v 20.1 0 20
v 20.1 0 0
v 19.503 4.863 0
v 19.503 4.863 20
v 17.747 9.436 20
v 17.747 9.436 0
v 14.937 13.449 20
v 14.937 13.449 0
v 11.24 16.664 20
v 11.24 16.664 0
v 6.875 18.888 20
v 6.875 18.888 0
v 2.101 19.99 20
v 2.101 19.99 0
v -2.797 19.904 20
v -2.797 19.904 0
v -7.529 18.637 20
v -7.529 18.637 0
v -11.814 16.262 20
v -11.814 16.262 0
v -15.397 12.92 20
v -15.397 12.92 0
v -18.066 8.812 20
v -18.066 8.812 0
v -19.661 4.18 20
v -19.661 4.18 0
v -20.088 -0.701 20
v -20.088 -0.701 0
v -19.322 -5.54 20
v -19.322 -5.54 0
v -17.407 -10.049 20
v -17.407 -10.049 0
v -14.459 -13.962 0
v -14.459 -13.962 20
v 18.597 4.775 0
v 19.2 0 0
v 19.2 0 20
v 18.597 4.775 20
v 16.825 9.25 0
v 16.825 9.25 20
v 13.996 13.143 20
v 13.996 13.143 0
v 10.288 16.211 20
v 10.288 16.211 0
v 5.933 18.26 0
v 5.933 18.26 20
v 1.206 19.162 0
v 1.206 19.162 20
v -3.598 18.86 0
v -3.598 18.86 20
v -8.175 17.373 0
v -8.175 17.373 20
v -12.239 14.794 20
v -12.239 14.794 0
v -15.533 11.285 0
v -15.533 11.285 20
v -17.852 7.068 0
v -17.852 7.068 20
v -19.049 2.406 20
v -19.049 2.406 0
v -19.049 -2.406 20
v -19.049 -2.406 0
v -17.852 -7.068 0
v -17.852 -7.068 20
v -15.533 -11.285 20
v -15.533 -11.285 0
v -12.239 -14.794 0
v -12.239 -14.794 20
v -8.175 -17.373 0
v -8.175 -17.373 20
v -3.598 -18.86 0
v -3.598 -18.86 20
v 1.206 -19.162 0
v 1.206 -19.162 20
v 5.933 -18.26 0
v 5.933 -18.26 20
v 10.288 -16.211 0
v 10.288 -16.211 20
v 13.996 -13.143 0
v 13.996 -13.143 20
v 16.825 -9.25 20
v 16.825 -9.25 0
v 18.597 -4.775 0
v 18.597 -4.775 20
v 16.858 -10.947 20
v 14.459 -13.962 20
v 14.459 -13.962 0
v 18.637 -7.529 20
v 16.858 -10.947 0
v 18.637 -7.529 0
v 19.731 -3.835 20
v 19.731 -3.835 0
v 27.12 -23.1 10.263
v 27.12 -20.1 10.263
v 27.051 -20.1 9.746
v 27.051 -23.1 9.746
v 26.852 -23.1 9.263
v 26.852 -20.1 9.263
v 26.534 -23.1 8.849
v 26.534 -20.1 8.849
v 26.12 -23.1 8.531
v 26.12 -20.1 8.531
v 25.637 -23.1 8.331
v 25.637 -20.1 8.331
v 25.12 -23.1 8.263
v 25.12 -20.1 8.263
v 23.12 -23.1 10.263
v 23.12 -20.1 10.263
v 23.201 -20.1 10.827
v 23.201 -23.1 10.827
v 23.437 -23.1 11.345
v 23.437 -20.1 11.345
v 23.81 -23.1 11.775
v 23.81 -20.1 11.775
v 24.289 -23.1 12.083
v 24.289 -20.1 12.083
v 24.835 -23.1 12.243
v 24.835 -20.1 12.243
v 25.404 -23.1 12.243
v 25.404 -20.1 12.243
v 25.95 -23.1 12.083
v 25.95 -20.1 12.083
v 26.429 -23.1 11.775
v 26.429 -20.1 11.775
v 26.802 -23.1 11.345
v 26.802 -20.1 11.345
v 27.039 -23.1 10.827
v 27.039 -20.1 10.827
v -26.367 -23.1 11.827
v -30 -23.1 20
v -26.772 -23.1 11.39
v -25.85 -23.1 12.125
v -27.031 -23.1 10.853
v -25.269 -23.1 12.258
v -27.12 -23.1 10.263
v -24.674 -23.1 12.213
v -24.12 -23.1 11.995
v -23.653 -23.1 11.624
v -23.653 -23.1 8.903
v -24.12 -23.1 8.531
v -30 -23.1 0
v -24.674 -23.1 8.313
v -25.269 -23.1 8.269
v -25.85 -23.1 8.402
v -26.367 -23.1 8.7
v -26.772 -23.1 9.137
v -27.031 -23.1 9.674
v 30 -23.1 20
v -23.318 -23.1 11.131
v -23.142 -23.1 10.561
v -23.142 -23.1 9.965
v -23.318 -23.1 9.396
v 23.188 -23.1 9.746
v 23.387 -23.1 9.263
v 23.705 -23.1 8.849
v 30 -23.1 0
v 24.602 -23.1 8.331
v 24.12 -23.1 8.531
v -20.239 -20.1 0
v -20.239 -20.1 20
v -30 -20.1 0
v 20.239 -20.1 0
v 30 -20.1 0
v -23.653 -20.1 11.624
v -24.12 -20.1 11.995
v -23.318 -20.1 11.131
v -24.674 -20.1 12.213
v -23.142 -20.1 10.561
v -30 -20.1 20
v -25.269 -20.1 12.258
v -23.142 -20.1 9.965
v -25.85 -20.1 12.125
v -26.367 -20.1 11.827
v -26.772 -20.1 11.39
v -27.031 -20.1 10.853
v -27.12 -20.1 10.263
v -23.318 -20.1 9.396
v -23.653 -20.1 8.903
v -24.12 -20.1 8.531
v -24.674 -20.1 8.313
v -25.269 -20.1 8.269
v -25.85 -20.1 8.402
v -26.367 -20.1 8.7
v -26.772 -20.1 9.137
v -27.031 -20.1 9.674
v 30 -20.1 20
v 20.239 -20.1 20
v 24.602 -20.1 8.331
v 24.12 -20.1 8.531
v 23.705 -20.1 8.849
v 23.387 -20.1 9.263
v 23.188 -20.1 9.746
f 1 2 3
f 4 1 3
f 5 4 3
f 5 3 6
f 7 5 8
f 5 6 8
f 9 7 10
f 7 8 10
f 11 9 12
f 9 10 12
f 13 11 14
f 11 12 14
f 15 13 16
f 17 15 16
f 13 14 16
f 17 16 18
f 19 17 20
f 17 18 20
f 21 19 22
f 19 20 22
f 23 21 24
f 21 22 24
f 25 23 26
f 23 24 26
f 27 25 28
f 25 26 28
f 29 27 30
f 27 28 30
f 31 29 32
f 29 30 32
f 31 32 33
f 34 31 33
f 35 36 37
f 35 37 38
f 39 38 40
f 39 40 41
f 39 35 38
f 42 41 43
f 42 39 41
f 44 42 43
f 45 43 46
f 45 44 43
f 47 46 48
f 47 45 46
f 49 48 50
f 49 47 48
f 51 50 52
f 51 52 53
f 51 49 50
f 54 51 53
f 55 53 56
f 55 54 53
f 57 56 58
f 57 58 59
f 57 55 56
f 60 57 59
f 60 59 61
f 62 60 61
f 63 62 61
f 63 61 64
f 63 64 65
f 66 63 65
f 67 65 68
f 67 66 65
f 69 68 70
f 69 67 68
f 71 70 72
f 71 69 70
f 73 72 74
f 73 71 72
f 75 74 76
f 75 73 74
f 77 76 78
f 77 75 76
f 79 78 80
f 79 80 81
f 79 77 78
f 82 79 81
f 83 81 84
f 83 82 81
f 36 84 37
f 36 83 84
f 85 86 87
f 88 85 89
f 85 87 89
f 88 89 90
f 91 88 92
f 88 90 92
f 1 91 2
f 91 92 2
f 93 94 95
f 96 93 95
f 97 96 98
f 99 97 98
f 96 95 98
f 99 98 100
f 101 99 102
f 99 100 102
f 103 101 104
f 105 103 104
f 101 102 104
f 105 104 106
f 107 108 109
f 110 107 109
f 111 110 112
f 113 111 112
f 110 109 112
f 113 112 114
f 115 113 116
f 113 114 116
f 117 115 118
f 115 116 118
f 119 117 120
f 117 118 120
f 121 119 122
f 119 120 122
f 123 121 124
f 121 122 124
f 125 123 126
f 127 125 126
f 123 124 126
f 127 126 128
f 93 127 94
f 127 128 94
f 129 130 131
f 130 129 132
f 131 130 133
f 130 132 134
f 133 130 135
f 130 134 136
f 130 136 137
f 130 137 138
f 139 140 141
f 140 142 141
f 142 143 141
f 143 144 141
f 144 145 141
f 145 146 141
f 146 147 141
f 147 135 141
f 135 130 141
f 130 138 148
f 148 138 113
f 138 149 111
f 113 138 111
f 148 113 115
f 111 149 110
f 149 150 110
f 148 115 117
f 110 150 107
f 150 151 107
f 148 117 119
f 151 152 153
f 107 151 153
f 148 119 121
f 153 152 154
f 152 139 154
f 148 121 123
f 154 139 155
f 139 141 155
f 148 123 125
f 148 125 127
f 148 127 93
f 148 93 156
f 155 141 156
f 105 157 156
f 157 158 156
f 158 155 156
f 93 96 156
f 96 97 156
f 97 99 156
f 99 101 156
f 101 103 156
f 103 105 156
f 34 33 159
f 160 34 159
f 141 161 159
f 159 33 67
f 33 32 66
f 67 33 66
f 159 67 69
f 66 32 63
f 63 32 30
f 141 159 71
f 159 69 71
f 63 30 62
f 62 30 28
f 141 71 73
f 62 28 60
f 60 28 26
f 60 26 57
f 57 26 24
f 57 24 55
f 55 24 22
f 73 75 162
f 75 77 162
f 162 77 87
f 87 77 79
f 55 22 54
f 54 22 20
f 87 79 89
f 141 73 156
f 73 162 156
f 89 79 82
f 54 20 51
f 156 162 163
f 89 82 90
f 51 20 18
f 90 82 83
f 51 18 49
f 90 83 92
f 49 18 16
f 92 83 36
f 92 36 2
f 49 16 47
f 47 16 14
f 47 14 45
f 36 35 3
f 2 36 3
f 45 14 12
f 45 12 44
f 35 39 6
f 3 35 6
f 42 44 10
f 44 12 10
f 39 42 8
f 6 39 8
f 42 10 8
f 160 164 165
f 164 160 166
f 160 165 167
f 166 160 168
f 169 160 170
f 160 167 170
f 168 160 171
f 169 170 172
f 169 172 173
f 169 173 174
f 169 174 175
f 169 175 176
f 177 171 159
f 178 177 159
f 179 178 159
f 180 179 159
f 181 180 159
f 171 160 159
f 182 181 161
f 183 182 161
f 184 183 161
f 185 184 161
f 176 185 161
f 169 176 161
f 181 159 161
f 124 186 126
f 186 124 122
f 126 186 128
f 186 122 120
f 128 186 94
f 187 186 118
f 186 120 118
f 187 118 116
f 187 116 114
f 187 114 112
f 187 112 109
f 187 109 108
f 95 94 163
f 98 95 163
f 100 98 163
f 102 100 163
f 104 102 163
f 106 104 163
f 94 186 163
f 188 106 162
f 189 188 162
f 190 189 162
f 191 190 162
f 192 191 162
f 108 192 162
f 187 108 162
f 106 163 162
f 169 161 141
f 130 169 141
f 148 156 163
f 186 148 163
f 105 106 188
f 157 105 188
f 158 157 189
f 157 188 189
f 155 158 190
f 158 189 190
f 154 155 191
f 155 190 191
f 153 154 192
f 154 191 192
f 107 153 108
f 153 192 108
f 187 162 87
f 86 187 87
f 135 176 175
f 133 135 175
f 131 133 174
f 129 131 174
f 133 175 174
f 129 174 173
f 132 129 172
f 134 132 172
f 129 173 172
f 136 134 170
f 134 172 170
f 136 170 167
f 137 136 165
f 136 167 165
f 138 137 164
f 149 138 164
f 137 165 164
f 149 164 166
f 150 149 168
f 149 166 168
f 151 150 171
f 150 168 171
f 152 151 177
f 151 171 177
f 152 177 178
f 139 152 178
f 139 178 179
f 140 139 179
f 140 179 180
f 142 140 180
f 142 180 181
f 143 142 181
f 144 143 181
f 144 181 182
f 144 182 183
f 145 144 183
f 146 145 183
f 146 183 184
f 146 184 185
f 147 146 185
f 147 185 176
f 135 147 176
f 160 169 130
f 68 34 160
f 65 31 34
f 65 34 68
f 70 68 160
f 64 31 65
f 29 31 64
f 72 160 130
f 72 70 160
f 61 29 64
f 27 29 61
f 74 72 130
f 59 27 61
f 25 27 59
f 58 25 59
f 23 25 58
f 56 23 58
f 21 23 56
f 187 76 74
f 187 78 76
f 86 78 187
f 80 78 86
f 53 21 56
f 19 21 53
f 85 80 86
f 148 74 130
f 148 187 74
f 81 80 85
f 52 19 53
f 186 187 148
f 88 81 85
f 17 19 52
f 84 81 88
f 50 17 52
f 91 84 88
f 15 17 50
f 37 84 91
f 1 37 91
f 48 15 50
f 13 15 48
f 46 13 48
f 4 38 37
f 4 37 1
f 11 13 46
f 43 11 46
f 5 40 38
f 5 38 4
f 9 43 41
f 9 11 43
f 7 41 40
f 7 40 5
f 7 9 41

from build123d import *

# Parameters (mm, degrees)
F0_R     = 19.2
F1_DEPTH = 20
F2_R     = 2
F3_DEPTH = 25


with BuildPart() as f1:
    # F0 (on Top) → F1 (new body)
    with BuildSketch(Plane.XY):
        with BuildLine():
            ThreePointArc((14.459278, -13.962065), (18.636543, -7.529227), (20.1, 0))
            ThreePointArc((20.1, 0), (-7.529227, 18.636543), (-14.459278, -13.962065))
            ThreePointArc((-14.459278, -13.962065), (-7.854059, -18.501993), (0, -20.1))
            ThreePointArc((0, -20.1), (7.854059, -18.501993), (14.459278, -13.962065))
        make_face()
        Circle(F0_R, mode=Mode.SUBTRACT)
        Polygon((0, -23.1), (0, -20.1), (-20.239076, -20.1), (-30, -20.1), (-30, -23.1), align=None)
        with BuildLine():
            Line((20.239076, -20.1), (14.459278, -13.962065))
            ThreePointArc((14.459278, -13.962065), (7.854059, -18.501993), (0, -20.1))
            Line((0, -20.1), (20.239076, -20.1))
        make_face()
        with BuildLine():
            ThreePointArc((0, -20.1), (-7.854059, -18.501993), (-14.459278, -13.962065))
            Line((-14.459278, -13.962065), (-20.239076, -20.1))
            Line((-20.239076, -20.1), (0, -20.1))
        make_face()
        Polygon((20.239076, -20.1), (0, -20.1), (0, -23.1), (30, -23.1), (30, -20.1), align=None)
    extrude(amount=F1_DEPTH)

    # F2 (on face) → F3 (cut)
    with BuildSketch(Plane(origin=(0, -20.1, 0), x_dir=(-1, 0, 0), z_dir=(0, 1, 0))):
        with BuildLine():
            Line((-25.119538, 10.263338), (-25.119538, 8.263338))
            ThreePointArc((-25.119538, 8.263338), (-23.705324, 8.849124), (-23.119538, 10.263338))
            ThreePointArc((-23.119538, 10.263338), (-25.119538, 12.263338), (-27.119538, 10.263338))
            Line((-27.119538, 10.263338), (-25.119538, 10.263338))
        make_face()
        with BuildLine():
            ThreePointArc((-27.119538, 10.263338), (-26.533751, 8.849124), (-25.119538, 8.263338))
            Line((-25.119538, 8.263338), (-25.119538, 10.263338))
            Line((-25.119538, 10.263338), (-27.119538, 10.263338))
        make_face()
        with Locations((25.119538, 10.263338)):
            Circle(F2_R)
    extrude(amount=-F3_DEPTH, mode=Mode.SUBTRACT)


solid = f1.part
